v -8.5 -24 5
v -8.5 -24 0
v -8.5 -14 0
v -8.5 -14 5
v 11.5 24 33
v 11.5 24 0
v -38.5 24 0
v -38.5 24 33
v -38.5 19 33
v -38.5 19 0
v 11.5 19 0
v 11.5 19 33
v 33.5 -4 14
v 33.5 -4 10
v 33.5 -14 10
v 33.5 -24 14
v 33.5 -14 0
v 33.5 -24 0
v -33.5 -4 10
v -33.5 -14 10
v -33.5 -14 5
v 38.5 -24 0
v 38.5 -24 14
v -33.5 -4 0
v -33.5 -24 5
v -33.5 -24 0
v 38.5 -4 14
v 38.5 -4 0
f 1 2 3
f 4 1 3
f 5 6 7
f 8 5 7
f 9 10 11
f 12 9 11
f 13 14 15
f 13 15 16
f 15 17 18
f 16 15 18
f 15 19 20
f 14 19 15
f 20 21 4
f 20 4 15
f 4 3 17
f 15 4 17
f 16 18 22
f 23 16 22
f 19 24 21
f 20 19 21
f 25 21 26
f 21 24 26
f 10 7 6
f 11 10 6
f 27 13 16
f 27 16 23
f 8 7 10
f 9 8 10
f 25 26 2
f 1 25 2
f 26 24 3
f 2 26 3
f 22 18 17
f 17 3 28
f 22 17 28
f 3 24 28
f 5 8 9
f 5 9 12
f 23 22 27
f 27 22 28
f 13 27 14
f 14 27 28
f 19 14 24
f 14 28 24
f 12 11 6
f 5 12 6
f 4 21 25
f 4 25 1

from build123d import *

# Parameters (mm, degrees)
F0_W     = 25
F0_H     = 10
F1_DEPTH = 5
F2_DEPTH = 10
F3_DEPTH = 14
F4_DEPTH = 33


with BuildPart() as f1:
    # F0 (on Top) → F1 (new body)
    with BuildSketch(Plane.XY):
        with Locations((-21, -19)):
            Rectangle(F0_W, F0_H)
    extrude(amount=F1_DEPTH)

    # F0 (on Top) → F2 (join)
    with BuildSketch(Plane.XY):
        Polygon((33.5, -14), (33.5, -4), (11.5, -4), (1.5, -4), (-8.5, -4), (-33.5, -4), (-33.5, -14), (-8.5, -14), align=None)
    extrude(amount=F2_DEPTH)

    # F0 (on Top) → F3 (join)
    with BuildSketch(Plane.XY):
        Polygon((38.5, -4), (33.5, -4), (33.5, -14), (33.5, -24), (38.5, -24), align=None)
    extrude(amount=F3_DEPTH)


with BuildPart() as f4:
    # F0 (on Top) → F4 (new body)
    with BuildSketch(Plane.XY):
        Polygon((11.5, 24), (-38.5, 24), (-38.5, 19), (-33.5, 19), (-8.5, 19), (1.5, 19), (11.5, 19), align=None)
    extrude(amount=F4_DEPTH)


solid = Compound([f1.part, f4.part])
